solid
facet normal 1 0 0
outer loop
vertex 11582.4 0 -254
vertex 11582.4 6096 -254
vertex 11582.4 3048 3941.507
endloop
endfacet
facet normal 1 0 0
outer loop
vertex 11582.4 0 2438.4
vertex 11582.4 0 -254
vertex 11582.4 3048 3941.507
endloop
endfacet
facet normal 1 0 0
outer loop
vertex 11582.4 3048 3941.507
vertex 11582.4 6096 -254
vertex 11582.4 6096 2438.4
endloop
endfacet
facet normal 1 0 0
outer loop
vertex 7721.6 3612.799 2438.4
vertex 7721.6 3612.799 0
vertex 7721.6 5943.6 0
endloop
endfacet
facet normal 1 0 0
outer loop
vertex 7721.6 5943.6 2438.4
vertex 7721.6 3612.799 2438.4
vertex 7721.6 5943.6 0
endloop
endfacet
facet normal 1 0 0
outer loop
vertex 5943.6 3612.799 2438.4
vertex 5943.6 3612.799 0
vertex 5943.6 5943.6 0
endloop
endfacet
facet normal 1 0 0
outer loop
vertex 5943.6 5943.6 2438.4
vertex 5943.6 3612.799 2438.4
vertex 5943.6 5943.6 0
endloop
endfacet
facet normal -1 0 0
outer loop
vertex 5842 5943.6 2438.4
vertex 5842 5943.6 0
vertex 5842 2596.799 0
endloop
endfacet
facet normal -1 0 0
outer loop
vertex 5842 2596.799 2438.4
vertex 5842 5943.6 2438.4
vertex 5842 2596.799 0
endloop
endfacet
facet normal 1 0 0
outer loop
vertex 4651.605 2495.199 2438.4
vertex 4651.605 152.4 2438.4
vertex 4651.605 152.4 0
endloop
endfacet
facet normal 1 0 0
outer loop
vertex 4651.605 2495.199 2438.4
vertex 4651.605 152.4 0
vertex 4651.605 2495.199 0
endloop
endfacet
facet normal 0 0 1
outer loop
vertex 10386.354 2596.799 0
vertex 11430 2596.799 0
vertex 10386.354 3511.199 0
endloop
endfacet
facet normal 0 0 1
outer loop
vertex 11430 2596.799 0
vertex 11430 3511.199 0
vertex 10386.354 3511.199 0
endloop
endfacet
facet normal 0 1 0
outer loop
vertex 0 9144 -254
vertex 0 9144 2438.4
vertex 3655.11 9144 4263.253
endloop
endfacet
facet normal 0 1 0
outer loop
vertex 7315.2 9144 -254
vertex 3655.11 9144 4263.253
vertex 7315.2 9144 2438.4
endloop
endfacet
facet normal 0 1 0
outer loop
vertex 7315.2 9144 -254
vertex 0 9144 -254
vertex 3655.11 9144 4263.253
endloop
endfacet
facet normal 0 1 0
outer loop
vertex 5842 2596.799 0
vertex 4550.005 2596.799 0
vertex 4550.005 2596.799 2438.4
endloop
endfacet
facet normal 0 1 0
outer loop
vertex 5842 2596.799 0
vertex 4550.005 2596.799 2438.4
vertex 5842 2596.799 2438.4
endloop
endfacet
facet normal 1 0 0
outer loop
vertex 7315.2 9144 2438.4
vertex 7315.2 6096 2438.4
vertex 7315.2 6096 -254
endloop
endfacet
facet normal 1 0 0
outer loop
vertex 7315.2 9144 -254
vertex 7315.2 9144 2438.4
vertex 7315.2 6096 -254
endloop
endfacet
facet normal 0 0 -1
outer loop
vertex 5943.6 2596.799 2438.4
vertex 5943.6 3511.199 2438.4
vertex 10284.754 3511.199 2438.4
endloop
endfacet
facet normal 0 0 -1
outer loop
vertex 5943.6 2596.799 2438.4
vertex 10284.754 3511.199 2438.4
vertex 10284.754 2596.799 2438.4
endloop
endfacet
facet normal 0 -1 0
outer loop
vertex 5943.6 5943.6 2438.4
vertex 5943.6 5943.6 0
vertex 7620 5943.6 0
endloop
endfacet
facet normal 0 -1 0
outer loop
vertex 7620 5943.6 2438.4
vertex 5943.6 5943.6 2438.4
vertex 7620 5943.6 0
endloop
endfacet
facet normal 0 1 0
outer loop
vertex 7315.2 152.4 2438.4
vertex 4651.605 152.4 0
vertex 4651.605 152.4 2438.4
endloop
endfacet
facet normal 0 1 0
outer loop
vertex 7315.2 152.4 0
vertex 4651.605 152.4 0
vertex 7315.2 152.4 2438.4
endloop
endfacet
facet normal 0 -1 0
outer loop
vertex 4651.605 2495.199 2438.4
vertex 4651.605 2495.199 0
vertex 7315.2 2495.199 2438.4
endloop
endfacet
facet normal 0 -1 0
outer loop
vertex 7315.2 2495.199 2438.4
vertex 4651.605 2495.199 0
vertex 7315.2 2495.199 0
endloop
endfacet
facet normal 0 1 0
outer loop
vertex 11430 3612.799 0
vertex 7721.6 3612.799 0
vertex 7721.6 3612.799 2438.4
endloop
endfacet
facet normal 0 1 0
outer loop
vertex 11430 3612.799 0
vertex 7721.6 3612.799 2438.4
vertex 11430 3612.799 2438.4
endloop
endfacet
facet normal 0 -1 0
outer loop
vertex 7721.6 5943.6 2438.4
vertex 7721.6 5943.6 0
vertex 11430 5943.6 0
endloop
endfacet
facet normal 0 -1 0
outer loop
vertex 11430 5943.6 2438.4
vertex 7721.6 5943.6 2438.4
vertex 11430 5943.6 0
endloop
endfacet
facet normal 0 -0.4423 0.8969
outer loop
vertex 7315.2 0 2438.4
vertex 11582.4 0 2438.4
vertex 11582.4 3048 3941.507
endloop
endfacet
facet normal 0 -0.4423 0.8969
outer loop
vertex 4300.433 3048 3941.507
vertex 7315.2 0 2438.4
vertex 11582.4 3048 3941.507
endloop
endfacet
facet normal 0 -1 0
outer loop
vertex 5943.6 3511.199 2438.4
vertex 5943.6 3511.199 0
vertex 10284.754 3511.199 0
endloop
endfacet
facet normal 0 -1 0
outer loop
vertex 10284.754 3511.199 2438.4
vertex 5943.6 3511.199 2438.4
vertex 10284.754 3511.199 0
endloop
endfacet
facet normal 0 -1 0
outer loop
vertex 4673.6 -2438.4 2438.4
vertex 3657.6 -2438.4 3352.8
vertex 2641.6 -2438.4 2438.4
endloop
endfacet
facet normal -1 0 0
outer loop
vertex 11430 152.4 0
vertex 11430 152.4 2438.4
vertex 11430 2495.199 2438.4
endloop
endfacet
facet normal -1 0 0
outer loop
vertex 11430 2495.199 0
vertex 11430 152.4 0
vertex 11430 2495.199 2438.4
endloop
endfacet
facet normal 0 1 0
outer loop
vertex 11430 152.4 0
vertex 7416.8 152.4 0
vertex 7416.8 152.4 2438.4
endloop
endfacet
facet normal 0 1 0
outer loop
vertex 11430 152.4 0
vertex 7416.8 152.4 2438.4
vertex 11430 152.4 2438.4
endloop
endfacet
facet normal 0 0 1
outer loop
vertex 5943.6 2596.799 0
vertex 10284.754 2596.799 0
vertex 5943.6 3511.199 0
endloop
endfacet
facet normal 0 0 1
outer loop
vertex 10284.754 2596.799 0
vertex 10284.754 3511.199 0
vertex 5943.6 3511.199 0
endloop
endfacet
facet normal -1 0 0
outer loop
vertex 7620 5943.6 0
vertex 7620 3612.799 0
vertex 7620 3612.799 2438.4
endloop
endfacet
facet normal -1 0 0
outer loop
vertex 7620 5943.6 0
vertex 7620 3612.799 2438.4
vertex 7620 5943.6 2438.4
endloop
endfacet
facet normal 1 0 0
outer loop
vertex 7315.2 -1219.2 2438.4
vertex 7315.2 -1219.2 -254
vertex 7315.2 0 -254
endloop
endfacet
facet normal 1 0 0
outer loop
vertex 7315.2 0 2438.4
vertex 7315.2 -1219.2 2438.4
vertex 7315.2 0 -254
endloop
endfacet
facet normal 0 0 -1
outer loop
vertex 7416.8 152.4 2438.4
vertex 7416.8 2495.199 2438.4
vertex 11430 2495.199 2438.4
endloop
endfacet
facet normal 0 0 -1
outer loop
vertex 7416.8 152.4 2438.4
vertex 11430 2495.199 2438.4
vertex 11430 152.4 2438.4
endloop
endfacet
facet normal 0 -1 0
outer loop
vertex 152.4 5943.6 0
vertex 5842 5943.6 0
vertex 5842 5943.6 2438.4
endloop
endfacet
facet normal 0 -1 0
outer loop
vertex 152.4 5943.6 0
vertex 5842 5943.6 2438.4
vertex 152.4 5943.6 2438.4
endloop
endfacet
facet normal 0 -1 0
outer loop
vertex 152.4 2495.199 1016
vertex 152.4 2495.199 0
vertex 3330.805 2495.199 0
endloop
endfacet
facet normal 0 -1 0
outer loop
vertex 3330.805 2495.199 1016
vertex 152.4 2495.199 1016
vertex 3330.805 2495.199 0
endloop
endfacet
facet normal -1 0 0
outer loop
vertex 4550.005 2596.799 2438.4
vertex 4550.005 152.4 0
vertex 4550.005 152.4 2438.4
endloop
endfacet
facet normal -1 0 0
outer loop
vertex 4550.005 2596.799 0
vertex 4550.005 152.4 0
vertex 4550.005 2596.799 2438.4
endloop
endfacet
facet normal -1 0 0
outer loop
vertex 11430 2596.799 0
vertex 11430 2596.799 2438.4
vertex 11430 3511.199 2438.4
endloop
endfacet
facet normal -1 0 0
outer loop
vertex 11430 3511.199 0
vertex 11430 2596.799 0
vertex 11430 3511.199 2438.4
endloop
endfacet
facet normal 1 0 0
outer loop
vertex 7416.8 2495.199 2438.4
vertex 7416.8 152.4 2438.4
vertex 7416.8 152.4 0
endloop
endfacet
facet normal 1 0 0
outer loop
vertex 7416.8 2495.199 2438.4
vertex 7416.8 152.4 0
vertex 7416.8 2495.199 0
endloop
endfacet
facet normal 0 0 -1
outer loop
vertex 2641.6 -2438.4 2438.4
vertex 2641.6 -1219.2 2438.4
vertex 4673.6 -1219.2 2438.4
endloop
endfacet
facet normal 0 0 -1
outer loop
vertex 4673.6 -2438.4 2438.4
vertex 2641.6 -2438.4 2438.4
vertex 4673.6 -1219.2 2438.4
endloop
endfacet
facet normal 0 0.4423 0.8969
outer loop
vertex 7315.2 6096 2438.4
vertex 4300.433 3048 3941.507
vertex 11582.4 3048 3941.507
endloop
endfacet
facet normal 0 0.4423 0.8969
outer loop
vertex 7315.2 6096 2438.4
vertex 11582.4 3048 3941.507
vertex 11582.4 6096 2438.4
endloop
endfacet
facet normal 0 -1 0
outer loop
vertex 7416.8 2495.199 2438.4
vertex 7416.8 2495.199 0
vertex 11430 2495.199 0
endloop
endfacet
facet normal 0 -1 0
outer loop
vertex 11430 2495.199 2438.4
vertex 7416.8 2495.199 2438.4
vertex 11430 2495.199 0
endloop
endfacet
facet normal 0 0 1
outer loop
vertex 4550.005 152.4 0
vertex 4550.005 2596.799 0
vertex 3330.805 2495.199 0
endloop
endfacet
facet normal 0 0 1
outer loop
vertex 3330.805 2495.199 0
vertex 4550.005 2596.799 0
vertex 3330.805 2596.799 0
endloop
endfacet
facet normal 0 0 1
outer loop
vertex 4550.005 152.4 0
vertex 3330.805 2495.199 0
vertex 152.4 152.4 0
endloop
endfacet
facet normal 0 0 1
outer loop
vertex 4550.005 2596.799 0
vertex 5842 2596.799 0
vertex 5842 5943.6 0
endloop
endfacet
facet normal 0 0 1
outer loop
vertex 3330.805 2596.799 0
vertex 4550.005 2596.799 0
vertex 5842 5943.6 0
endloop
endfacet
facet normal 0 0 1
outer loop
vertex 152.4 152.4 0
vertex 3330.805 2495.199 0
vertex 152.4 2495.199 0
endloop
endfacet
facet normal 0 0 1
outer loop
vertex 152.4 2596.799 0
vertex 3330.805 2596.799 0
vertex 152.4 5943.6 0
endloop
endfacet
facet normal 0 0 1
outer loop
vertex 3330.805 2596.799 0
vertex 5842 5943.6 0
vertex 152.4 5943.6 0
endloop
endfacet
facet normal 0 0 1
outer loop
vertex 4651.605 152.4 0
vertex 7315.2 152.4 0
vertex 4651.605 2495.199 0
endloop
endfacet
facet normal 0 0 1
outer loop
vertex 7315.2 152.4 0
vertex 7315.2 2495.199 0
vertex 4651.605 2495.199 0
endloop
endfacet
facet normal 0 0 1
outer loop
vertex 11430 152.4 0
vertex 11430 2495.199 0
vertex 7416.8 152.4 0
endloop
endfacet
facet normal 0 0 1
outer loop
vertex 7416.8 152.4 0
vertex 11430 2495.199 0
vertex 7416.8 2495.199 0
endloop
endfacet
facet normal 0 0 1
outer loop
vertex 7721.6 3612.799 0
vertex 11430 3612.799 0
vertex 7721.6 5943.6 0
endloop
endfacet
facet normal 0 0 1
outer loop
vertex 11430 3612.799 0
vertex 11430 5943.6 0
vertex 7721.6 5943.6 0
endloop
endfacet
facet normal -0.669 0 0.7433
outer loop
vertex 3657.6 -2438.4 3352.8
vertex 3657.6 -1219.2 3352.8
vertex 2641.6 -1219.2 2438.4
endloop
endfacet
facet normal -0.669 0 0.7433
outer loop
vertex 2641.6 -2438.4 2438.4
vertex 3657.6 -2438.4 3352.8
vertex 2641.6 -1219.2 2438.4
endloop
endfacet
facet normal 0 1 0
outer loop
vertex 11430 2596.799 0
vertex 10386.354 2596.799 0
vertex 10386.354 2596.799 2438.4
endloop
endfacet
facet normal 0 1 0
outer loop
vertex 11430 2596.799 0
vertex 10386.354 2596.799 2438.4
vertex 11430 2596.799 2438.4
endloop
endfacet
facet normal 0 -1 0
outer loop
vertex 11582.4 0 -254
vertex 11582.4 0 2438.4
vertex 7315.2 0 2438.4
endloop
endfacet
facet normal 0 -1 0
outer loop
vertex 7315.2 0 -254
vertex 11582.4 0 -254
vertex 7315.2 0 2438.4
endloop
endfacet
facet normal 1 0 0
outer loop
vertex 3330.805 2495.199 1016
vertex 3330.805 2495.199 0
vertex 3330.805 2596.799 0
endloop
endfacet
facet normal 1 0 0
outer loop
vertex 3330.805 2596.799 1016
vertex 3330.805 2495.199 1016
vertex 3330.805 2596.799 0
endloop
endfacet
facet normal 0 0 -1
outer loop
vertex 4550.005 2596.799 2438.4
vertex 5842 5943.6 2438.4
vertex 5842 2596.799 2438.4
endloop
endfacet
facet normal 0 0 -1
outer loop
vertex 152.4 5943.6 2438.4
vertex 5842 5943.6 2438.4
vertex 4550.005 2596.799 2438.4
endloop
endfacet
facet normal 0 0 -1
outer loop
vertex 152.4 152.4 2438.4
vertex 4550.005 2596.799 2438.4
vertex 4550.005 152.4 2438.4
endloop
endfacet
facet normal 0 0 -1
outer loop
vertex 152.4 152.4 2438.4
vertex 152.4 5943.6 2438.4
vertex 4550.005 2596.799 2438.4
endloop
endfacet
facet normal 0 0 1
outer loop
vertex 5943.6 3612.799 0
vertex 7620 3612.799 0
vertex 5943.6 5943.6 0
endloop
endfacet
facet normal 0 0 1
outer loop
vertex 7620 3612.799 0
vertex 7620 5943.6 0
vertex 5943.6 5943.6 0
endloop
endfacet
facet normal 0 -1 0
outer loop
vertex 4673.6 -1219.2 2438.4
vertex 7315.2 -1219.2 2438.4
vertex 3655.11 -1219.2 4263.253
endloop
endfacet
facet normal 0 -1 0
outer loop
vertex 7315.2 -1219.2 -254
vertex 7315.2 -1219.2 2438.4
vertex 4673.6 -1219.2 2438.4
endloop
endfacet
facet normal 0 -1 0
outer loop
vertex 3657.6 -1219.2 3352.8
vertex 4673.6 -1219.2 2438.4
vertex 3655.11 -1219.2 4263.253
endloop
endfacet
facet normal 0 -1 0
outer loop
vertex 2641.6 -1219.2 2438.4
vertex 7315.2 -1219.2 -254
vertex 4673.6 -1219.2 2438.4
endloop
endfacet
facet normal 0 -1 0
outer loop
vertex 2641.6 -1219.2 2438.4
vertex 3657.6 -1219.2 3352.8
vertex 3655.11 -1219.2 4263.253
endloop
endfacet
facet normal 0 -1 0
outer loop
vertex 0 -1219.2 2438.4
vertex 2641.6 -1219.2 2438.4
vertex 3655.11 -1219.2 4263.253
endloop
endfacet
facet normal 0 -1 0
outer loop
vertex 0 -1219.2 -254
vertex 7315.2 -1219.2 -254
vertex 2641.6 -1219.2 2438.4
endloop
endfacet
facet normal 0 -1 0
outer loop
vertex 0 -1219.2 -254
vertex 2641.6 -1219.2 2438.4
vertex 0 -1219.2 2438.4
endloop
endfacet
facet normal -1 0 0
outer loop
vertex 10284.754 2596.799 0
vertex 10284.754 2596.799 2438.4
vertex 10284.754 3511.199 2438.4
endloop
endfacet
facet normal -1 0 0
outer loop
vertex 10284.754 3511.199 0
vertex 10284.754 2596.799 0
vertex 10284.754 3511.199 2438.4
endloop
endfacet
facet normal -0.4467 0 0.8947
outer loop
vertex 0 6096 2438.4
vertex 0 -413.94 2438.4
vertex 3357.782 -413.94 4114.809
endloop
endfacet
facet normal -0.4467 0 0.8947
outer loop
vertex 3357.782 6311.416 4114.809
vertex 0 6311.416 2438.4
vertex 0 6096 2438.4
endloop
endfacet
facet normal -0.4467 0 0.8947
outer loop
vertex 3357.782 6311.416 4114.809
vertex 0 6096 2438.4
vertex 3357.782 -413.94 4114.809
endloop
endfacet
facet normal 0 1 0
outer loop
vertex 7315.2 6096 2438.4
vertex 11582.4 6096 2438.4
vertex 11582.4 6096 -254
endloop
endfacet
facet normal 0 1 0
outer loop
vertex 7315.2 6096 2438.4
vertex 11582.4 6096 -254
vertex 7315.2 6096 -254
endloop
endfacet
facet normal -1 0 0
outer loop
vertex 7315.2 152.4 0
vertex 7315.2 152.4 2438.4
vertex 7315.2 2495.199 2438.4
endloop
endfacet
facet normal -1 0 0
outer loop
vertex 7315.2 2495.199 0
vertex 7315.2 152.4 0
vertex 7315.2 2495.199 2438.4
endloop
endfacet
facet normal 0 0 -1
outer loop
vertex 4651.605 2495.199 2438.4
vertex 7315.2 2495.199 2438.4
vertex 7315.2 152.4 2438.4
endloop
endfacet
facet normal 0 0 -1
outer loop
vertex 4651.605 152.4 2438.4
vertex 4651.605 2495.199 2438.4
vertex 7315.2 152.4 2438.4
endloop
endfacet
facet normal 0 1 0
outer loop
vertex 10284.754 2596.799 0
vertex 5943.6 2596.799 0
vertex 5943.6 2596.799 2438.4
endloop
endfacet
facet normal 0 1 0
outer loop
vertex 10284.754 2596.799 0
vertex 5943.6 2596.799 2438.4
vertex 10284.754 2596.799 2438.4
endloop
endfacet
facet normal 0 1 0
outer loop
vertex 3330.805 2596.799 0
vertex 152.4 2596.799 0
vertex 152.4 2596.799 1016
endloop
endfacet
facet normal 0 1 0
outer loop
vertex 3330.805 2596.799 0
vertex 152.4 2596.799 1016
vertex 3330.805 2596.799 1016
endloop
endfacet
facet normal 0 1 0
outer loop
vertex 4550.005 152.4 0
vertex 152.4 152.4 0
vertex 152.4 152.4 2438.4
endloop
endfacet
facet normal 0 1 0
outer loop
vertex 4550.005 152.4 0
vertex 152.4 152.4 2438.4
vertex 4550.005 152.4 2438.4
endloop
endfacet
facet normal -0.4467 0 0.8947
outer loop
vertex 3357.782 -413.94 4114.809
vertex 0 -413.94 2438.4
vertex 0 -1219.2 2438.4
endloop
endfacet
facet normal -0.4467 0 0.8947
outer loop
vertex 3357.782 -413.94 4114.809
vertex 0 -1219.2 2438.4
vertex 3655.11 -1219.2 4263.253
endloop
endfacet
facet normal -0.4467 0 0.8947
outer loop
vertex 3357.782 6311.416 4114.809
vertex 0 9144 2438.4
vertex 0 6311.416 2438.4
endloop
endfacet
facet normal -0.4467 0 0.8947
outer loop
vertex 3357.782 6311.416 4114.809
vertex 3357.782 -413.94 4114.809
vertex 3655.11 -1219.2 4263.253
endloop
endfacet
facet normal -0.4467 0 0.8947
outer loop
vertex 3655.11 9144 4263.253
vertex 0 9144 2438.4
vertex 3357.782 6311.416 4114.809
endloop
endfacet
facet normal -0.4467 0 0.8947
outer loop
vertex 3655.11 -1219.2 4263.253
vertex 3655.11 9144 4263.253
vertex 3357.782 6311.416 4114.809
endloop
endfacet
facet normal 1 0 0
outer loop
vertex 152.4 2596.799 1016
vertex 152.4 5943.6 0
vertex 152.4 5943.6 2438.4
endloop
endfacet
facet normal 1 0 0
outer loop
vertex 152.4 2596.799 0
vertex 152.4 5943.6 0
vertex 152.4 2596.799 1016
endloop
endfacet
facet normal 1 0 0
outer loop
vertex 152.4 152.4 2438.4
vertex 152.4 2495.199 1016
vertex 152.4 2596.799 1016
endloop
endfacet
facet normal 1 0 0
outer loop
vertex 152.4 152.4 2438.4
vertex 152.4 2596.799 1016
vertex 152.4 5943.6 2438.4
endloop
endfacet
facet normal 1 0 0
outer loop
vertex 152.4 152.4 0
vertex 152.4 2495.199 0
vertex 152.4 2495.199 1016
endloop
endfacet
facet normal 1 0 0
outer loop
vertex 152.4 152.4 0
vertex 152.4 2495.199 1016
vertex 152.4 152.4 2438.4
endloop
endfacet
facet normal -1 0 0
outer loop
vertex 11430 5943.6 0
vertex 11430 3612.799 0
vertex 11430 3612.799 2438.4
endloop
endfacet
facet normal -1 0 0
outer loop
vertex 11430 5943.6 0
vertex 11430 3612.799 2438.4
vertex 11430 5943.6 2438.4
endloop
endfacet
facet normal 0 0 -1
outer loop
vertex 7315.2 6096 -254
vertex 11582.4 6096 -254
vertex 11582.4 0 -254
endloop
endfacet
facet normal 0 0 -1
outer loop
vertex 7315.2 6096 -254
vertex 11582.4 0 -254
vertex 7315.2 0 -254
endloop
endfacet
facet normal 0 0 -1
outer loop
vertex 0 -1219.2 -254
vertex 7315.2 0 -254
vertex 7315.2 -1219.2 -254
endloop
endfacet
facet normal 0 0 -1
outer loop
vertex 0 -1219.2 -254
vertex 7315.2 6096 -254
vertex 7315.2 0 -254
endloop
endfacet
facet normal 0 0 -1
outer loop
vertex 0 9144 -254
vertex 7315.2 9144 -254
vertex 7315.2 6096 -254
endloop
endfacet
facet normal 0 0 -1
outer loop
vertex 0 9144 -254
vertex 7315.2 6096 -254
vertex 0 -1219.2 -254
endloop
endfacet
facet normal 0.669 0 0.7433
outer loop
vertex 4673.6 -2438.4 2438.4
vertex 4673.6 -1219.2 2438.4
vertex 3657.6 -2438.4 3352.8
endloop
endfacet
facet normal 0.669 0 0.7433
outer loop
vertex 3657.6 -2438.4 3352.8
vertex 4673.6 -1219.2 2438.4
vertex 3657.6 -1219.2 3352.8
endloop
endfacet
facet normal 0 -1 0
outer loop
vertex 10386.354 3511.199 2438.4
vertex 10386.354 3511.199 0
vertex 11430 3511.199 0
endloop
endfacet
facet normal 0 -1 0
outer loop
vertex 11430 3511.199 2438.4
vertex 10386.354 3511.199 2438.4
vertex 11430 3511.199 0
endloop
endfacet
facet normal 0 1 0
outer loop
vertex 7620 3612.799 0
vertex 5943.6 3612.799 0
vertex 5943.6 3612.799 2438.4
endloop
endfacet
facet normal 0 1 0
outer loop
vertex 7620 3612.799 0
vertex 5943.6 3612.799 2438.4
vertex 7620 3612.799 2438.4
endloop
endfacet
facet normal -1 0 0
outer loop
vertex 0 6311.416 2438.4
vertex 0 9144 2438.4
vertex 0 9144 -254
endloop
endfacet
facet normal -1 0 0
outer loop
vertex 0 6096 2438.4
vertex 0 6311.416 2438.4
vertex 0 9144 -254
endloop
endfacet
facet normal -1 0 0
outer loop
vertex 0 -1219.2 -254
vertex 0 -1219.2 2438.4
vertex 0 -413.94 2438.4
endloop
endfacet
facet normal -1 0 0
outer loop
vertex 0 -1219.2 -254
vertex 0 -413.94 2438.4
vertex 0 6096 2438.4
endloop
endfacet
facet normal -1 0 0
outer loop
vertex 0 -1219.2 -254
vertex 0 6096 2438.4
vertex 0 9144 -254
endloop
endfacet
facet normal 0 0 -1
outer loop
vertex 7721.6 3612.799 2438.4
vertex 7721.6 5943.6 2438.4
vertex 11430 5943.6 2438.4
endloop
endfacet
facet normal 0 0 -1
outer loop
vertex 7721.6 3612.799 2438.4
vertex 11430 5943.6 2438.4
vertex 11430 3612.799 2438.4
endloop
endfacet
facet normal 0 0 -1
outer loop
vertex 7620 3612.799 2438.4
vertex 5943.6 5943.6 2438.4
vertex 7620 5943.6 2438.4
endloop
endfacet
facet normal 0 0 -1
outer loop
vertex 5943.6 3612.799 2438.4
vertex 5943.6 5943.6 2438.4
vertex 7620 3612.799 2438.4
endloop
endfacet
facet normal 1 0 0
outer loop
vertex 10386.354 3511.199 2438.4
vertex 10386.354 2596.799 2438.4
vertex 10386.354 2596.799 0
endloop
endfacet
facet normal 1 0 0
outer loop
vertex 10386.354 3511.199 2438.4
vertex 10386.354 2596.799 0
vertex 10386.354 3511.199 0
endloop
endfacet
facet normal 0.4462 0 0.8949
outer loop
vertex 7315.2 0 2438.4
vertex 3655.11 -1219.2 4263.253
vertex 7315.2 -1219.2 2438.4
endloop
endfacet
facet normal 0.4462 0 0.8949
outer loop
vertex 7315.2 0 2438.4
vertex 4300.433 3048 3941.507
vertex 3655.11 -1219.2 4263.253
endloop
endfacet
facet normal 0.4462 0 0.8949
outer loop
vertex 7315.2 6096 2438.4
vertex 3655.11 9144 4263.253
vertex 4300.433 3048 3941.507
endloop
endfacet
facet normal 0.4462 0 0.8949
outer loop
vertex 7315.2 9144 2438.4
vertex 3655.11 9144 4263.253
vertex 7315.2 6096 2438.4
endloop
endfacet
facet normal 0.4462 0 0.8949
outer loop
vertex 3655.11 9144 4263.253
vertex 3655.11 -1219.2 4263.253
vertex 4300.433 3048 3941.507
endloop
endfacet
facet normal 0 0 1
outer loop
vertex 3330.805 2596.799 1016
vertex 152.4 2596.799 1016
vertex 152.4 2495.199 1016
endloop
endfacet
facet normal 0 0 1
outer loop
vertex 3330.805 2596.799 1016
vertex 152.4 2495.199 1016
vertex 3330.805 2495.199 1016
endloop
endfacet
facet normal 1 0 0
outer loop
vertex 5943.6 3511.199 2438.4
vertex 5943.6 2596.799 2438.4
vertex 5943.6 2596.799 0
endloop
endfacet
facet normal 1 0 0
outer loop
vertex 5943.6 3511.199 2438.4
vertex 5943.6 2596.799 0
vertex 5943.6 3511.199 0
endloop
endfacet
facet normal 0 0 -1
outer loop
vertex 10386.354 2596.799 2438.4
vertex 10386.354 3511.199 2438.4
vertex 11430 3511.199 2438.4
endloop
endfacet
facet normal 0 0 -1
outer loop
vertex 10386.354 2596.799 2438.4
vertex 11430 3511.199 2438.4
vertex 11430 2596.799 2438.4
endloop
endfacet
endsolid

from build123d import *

# Parameters (mm, degrees)
SKETCH3_W            = 11582.4
SKETCH3_H            = 6096
SKETCH3_W_2          = 4341.154286856
SKETCH3_H_2          = 914.4
SKETCH3_W_3          = 1676.4
SKETCH3_H_3          = 2330.801356814
SKETCH3_W_4          = 2663.595025017
SKETCH3_H_4          = 2342.798643186
SKETCH3_W_5          = 1043.645713144
SKETCH3_W_6          = 4013.2
SKETCH3_W_7          = 3708.4
BOSS_EXTRUDE1_DEPTH  = 2438.4
SKETCH4_W            = 11582.4
SKETCH4_H            = 6096
BOSS_EXTRUDE2_DEPTH  = 254
SKETCH5_W            = 3178.404974983
SKETCH5_H            = 101.6
BOSS_EXTRUDE3_DEPTH  = 1016
BOSS_EXTRUDE4_DEPTH  = 11582.4
SKETCH8_W            = 7315.2
SKETCH8_H            = 3048
BOSS_EXTRUDE6_DEPTH  = 254
BOSS_EXTRUDE7_DEPTH  = 10363.2
SKETCH12_W           = 7315.2
SKETCH12_H           = 1219.2
BOSS_EXTRUDE8_DEPTH  = 2692.4
BOSS_EXTRUDE9_DEPTH  = 1219.2
SKETCH18_W           = 5091.335525139
SKETCH18_H           = 6725.356075379
CUT_EXTRUDE5_DEPTH   = 7574.28
SKETCH20_W           = 7315.2
SKETCH20_H           = 2438.4
BOSS_EXTRUDE10_DEPTH = 3048


with BuildPart() as part:
    # Sketch3 → Boss-Extrude1 (new body)
    with BuildSketch(Plane.XY):
        with Locations((5791.2, 3048)):
            Rectangle(SKETCH3_W, SKETCH3_H)
        Polygon((152.4, 152.4), (4550.004974983, 152.4), (4550.004974983, 2596.798643186), (5842, 2596.798643186), (5842, 3511.198643186), (5842, 5943.6), (152.4, 5943.6), align=None, mode=Mode.SUBTRACT)
        with Locations((8114.177143428, 3053.998643186)):
            Rectangle(SKETCH3_W_2, SKETCH3_H_2, mode=Mode.SUBTRACT)
        with Locations((6781.8, 4778.199321593)):
            Rectangle(SKETCH3_W_3, SKETCH3_H_3, mode=Mode.SUBTRACT)
        with Locations((5983.402487492, 1323.799321593)):
            Rectangle(SKETCH3_W_4, SKETCH3_H_4, mode=Mode.SUBTRACT)
        with Locations((10908.177143428, 3053.998643186)):
            Rectangle(SKETCH3_W_5, SKETCH3_H_2, mode=Mode.SUBTRACT)
        with Locations((9423.4, 1323.799321593)):
            Rectangle(SKETCH3_W_6, SKETCH3_H_4, mode=Mode.SUBTRACT)
        with Locations((9575.8, 4778.199321593)):
            Rectangle(SKETCH3_W_7, SKETCH3_H_3, mode=Mode.SUBTRACT)
    extrude(amount=BOSS_EXTRUDE1_DEPTH)

    # Sketch4 → Boss-Extrude2 (add)
    with BuildSketch(Plane(origin=(0, 0, 0), x_dir=(-1, 0, 0), z_dir=(0, 0, -1))):
        with Locations((-5791.2, 3048)):
            Rectangle(SKETCH4_W, SKETCH4_H)
    extrude(amount=BOSS_EXTRUDE2_DEPTH)

    # Sketch5 → Boss-Extrude3 (add)
    with BuildSketch(Plane.XY):
        with Locations((1741.602487492, 2545.998643186)):
            Rectangle(SKETCH5_W, SKETCH5_H)
    extrude(amount=BOSS_EXTRUDE3_DEPTH)

    # Sketch6 → Boss-Extrude4 (add)
    with BuildSketch(Plane.ZY):
        Polygon((2438.4, 6096), (2438.4, 0), (3941.507258543, 3048), align=None)
    extrude(amount=-BOSS_EXTRUDE4_DEPTH)

    # Sketch10 → Boss-Extrude7 (add)
    with BuildSketch(Plane(origin=(0, 9144, 0), x_dir=(1, 0, 0), z_dir=(0, 1, 0))):
        Polygon((7315.2, -2438.4), (0, -2438.4), (3655.110432816, -4263.253342026), align=None)
    extrude(amount=-BOSS_EXTRUDE7_DEPTH)

    # Sketch12 → Boss-Extrude8 (add)
    with BuildSketch(Plane(origin=(0, 0, -254), x_dir=(-1, 0, 0), z_dir=(0, 0, -1))):
        with Locations((-3657.6, -609.6)):
            Rectangle(SKETCH12_W, SKETCH12_H)
    extrude(amount=-BOSS_EXTRUDE8_DEPTH)

    # Sketch15 → Boss-Extrude9 (add)
    with BuildSketch(Plane.XZ.offset(1219.2)):
        Polygon((2641.6, 2438.4), (4673.6, 2438.4), (3657.6, 3352.8), align=None)
    extrude(amount=BOSS_EXTRUDE9_DEPTH)

    # Sketch18 → Cut-Extrude5 (cut)
    with BuildSketch(Plane(origin=(-974.493873117, 0, 1951.873413778), x_dir=(0.894691579, 0, 0.446684429), z_dir=(-0.446684429, 0, 0.894691579))):
        with Locations((2296.53232092, 2948.73787515)):
            Rectangle(SKETCH18_W, SKETCH18_H)
    extrude(amount=CUT_EXTRUDE5_DEPTH, mode=Mode.SUBTRACT)



with BuildPart() as body_2:
    # Sketch8 → Boss-Extrude6 (new body)
    with BuildSketch(Plane(origin=(0, 0, -254), x_dir=(-1, 0, 0), z_dir=(0, 0, -1))):
        with Locations((-3657.6, 7620)):
            Rectangle(SKETCH8_W, SKETCH8_H)
    extrude(amount=-BOSS_EXTRUDE6_DEPTH)


with BuildPart() as part_1:
    add(part.part)

    add(body_2.part)  # Boss-Extrude10 merges body 2
    # Sketch20 → Boss-Extrude10 (add)
    with BuildSketch(Plane(origin=(0, 6096, 0), x_dir=(1, 0, 0), z_dir=(0, 1, 0))):
        with Locations((3657.6, -1219.2)):
            Rectangle(SKETCH20_W, SKETCH20_H)
    extrude(amount=BOSS_EXTRUDE10_DEPTH)


solid = part_1.part
